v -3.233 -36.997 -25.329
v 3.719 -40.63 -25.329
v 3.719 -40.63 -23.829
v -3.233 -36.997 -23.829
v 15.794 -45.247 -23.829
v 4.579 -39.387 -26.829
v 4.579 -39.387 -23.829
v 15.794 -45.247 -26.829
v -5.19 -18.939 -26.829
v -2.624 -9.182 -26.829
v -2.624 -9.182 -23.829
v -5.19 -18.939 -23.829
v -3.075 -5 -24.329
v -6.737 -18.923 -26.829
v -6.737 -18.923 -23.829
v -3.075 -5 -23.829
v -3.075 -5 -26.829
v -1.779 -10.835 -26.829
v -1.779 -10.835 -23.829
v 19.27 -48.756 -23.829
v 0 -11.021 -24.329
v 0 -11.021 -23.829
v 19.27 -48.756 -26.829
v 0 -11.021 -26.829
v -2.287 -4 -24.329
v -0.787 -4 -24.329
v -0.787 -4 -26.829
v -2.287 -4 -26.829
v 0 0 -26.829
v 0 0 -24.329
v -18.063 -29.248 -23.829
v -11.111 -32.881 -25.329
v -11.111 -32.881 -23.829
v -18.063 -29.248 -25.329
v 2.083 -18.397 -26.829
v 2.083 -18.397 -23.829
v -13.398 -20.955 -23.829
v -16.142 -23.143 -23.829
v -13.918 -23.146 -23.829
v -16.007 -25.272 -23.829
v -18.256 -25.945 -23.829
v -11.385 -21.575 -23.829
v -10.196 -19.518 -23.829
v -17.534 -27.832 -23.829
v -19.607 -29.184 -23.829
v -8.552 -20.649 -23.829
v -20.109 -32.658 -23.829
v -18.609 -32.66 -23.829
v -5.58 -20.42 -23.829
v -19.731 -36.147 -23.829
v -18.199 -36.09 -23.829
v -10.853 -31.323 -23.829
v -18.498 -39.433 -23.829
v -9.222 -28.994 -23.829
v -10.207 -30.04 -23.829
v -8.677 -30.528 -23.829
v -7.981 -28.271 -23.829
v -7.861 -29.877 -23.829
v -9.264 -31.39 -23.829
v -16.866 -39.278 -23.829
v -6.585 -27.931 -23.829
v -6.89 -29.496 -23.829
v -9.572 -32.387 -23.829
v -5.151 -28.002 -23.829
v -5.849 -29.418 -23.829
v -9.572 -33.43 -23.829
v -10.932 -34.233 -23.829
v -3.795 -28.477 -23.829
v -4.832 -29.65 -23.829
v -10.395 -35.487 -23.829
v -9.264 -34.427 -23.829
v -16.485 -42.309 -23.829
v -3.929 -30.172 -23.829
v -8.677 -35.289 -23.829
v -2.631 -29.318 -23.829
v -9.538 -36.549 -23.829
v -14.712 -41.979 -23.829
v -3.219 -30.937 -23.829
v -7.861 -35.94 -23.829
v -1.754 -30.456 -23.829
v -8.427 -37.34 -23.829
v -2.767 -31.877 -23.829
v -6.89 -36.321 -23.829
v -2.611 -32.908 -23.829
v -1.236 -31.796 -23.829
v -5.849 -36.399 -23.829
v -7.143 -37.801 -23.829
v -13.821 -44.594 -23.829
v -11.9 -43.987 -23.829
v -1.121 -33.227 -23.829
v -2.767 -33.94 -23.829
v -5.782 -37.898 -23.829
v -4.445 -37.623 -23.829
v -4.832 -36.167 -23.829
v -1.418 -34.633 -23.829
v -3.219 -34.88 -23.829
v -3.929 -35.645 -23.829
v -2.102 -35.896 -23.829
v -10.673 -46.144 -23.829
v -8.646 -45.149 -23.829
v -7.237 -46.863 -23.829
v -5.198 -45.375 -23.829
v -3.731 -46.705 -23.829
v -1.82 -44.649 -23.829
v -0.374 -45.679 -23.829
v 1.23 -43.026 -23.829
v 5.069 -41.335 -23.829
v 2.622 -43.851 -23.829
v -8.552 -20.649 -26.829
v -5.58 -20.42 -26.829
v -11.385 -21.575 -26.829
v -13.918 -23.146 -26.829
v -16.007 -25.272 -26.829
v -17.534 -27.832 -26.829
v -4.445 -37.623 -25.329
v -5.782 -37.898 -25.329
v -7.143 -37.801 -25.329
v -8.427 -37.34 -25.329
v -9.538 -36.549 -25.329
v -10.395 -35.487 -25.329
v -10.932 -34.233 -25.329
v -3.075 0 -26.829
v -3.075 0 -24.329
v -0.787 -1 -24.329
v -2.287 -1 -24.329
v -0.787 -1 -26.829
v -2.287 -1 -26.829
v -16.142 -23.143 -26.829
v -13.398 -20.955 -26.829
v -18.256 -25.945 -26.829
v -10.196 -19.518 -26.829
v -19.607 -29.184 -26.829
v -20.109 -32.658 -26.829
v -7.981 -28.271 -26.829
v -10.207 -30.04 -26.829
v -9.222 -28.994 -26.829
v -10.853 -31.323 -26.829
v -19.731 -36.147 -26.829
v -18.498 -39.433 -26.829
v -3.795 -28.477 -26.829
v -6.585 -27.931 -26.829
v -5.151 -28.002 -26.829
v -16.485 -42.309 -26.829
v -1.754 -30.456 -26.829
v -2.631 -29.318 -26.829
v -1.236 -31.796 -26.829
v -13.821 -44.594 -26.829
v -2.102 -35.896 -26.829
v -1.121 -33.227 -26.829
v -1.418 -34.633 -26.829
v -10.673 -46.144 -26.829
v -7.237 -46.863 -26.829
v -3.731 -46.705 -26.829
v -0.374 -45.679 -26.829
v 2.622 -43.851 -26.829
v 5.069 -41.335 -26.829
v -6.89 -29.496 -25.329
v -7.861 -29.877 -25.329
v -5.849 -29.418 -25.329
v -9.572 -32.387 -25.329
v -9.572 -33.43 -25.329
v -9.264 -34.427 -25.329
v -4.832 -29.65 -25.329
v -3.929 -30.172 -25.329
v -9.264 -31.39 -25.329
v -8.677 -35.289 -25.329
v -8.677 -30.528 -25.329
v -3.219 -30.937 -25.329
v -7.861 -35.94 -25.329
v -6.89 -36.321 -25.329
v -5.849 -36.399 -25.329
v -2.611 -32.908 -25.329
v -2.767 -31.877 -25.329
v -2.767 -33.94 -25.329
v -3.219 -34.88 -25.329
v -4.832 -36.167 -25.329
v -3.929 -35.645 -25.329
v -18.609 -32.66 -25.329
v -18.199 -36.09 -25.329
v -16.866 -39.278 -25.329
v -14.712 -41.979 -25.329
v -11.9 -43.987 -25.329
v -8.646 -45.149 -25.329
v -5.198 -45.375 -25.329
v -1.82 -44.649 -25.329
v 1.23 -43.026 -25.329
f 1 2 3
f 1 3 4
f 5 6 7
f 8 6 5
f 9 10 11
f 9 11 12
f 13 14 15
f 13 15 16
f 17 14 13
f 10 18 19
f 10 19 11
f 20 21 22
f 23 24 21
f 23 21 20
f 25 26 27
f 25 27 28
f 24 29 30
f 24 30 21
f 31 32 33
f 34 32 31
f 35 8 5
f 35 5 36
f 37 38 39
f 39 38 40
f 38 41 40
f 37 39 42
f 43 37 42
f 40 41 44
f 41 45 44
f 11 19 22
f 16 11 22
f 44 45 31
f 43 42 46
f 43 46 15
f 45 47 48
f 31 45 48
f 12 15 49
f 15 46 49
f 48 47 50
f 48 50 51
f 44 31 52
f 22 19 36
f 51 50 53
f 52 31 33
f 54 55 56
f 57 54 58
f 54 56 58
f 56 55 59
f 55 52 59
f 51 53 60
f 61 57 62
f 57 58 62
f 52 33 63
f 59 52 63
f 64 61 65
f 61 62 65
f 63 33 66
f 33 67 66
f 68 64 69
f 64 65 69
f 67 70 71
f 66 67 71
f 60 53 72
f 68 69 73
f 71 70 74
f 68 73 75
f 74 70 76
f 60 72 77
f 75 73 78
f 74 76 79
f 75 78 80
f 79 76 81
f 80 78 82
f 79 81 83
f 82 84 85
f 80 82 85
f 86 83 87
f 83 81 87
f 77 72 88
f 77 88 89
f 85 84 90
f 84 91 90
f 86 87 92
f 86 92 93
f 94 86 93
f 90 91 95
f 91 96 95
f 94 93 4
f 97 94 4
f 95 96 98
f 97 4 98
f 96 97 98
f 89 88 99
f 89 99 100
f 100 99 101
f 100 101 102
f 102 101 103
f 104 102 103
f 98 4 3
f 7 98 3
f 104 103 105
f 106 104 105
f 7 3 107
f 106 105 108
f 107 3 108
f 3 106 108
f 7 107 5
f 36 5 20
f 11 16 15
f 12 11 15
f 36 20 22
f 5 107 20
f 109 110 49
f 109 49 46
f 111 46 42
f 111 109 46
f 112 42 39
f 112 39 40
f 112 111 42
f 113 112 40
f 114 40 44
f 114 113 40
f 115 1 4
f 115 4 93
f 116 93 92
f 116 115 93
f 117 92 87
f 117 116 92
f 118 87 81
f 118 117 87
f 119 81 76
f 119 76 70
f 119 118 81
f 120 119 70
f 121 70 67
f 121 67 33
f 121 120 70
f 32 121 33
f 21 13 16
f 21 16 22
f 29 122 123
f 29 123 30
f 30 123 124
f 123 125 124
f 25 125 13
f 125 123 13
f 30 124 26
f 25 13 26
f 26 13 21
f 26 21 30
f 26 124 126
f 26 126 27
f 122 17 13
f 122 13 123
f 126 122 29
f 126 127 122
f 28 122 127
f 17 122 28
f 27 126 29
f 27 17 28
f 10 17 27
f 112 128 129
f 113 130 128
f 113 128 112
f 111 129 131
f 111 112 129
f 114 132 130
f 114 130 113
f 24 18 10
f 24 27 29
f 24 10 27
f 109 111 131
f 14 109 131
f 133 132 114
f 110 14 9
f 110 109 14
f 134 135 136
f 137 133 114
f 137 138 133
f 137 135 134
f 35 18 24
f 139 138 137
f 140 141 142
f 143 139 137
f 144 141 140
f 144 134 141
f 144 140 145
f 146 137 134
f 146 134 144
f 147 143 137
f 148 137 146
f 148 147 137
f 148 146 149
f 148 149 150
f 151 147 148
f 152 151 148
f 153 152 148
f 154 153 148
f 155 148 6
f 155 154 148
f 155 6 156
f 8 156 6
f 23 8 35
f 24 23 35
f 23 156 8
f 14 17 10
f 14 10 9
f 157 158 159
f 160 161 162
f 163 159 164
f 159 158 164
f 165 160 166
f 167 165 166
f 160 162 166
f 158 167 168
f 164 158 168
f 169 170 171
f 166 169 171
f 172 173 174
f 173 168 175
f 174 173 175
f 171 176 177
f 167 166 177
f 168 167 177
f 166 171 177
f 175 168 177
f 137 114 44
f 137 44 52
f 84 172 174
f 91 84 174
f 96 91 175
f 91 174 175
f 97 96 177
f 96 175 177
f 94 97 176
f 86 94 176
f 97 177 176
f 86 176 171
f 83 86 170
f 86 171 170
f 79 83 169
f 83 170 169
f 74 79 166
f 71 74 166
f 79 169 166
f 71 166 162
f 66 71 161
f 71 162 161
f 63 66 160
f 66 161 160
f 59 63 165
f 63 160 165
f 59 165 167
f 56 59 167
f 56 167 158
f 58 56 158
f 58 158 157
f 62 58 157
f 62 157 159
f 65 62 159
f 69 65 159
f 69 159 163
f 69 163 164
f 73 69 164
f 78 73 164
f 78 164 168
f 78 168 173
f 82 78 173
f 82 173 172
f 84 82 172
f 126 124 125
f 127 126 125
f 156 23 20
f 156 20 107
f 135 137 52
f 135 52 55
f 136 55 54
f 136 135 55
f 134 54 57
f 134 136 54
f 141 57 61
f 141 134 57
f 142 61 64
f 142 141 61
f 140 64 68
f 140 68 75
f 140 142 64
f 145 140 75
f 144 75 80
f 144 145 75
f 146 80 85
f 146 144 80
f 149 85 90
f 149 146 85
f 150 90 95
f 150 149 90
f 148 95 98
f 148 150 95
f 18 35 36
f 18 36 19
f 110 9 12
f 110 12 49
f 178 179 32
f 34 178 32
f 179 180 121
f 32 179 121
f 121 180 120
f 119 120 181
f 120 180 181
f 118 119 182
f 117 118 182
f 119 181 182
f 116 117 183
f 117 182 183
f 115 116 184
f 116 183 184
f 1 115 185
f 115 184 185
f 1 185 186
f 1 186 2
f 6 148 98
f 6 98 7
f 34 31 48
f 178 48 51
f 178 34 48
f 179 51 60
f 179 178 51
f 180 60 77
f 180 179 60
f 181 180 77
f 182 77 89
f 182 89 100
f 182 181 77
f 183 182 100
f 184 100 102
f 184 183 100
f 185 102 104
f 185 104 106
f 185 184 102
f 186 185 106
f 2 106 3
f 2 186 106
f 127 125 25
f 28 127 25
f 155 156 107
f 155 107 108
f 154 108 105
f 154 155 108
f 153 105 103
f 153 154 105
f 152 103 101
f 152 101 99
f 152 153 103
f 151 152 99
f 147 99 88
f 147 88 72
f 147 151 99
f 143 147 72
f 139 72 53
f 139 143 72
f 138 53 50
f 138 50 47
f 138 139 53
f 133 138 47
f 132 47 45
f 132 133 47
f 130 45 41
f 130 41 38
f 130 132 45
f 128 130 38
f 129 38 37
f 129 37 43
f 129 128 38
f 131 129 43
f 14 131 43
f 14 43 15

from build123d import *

# Parameters (mm, degrees)
F0_R     = 3.5
F1_DEPTH = 3
F2_DEPTH = 1.5
F3_DEPTH = 2.5
F4_W     = 1.5
F4_H     = 3
F5_DEPTH = 25
F6_ANGLE = 90


with BuildPart() as f1:
    # F0 (on Front) → F1 (new body)
    with BuildSketch(Plane.XZ):
        with BuildLine():
            ThreePointArc((5.0689673904, 14.5063923622), (-18.497586517, 12.604527099), (-6.7371360863, -7.9062349594))
            Line((-6.7371360863, -7.9062349594), (-3.0749836005, -21.8287352473))
            Line((-3.0749836005, -21.8287352473), (0, -15.8073518255))
            Line((0, -15.8073518255), (19.2700356521, 21.9269220071))
            Line((19.2700356521, 21.9269220071), (5.0689673904, 14.5063923622))
        make_face()
        with BuildLine():
            ThreePointArc((-5.5799534775, -6.4089575685), (-12.6983133538, -4.5436790019), (-17.5337629503, 1.0032786019))
            Line((-17.5337629503, 1.0032786019), (-10.852955333, 4.494222386))
            ThreePointArc((-10.852955333, 4.494222386), (-3.7954106953, 1.6482764037), (-2.1015582996, 9.067117884))
            Line((-2.1015582996, 9.067117884), (4.5792493177, 12.5580616681))
            Line((4.5792493177, 12.5580616681), (15.7938726924, 18.418074709))
            Line((15.7938726924, 18.418074709), (2.0825346023, -8.431246976))
            Line((2.0825346023, -8.431246976), (-1.7794150282, -15.9936546184))
            Line((-1.7794150282, -15.9936546184), (-2.6238568394, -17.6472269892))
            Line((-2.6238568394, -17.6472269892), (-5.1903976779, -7.8899419766))
            Line((-5.1903976779, -7.8899419766), (-5.5799534775, -6.4089575685))
        make_face(mode=Mode.SUBTRACT)
        with Locations((-6.1110062525, 6.0797566548)):
            Circle(F0_R, mode=Mode.SUBTRACT)
        with BuildLine():
            Line((-11.1109284274, 6.0518596218), (-18.0629985994, 2.4191721469))
            ThreePointArc((-18.0629985994, 2.4191721469), (-11.8999951454, 17.1584572825), (3.7191276324, 13.8010562737))
            Line((3.7191276324, 13.8010562737), (-3.2329425395, 10.1683687988))
            ThreePointArc((-3.2329425395, 10.1683687988), (-8.4266018096, 10.5112369059), (-11.1109284274, 6.0518596218))
        make_face(mode=Mode.SUBTRACT)
    extrude(amount=-F1_DEPTH)

    # F0 (on Front) → F2 (join)
    with BuildSketch(Plane.XZ):
        with BuildLine():
            ThreePointArc((3.7191276324, 13.8010562737), (-11.8999951454, 17.1584572825), (-18.0629985994, 2.4191721469))
            Line((-18.0629985994, 2.4191721469), (-11.1109284274, 6.0518596218))
            ThreePointArc((-11.1109284274, 6.0518596218), (-8.4266018096, 10.5112369059), (-3.2329425395, 10.1683687988))
            Line((-3.2329425395, 10.1683687988), (3.7191276324, 13.8010562737))
        make_face()
        with Locations((-6.1110062525, 6.0797566548)):
            Circle(F0_R)
    extrude(amount=-F2_DEPTH)

    # F0 (on Front) → F3 (join)
    with BuildSketch(Plane.XZ):
        Polygon((0, -15.8073518255), (-3.0749836005, -21.8287352473), (-3.0749836005, -26.8287352473), (0, -26.8287352473), align=None)
    extrude(amount=-F3_DEPTH)

    # F4 (on face) → F5 (cut)
    with BuildSketch(Plane(origin=(0, 2.5, 0), x_dir=(-1, 0, 0), z_dir=(0, 1, 0))):
        with Locations((1.5374918003, -24.3287352473)):
            Rectangle(F4_W, F4_H)
    extrude(amount=-F5_DEPTH, mode=Mode.SUBTRACT)


with BuildPart() as f1_1:
    # F6: moved
    add(f1.part.rotate(Axis((-1.5374918003, 0, -26.8287352473), (1, 0, 0)), F6_ANGLE))


solid = f1_1.part
